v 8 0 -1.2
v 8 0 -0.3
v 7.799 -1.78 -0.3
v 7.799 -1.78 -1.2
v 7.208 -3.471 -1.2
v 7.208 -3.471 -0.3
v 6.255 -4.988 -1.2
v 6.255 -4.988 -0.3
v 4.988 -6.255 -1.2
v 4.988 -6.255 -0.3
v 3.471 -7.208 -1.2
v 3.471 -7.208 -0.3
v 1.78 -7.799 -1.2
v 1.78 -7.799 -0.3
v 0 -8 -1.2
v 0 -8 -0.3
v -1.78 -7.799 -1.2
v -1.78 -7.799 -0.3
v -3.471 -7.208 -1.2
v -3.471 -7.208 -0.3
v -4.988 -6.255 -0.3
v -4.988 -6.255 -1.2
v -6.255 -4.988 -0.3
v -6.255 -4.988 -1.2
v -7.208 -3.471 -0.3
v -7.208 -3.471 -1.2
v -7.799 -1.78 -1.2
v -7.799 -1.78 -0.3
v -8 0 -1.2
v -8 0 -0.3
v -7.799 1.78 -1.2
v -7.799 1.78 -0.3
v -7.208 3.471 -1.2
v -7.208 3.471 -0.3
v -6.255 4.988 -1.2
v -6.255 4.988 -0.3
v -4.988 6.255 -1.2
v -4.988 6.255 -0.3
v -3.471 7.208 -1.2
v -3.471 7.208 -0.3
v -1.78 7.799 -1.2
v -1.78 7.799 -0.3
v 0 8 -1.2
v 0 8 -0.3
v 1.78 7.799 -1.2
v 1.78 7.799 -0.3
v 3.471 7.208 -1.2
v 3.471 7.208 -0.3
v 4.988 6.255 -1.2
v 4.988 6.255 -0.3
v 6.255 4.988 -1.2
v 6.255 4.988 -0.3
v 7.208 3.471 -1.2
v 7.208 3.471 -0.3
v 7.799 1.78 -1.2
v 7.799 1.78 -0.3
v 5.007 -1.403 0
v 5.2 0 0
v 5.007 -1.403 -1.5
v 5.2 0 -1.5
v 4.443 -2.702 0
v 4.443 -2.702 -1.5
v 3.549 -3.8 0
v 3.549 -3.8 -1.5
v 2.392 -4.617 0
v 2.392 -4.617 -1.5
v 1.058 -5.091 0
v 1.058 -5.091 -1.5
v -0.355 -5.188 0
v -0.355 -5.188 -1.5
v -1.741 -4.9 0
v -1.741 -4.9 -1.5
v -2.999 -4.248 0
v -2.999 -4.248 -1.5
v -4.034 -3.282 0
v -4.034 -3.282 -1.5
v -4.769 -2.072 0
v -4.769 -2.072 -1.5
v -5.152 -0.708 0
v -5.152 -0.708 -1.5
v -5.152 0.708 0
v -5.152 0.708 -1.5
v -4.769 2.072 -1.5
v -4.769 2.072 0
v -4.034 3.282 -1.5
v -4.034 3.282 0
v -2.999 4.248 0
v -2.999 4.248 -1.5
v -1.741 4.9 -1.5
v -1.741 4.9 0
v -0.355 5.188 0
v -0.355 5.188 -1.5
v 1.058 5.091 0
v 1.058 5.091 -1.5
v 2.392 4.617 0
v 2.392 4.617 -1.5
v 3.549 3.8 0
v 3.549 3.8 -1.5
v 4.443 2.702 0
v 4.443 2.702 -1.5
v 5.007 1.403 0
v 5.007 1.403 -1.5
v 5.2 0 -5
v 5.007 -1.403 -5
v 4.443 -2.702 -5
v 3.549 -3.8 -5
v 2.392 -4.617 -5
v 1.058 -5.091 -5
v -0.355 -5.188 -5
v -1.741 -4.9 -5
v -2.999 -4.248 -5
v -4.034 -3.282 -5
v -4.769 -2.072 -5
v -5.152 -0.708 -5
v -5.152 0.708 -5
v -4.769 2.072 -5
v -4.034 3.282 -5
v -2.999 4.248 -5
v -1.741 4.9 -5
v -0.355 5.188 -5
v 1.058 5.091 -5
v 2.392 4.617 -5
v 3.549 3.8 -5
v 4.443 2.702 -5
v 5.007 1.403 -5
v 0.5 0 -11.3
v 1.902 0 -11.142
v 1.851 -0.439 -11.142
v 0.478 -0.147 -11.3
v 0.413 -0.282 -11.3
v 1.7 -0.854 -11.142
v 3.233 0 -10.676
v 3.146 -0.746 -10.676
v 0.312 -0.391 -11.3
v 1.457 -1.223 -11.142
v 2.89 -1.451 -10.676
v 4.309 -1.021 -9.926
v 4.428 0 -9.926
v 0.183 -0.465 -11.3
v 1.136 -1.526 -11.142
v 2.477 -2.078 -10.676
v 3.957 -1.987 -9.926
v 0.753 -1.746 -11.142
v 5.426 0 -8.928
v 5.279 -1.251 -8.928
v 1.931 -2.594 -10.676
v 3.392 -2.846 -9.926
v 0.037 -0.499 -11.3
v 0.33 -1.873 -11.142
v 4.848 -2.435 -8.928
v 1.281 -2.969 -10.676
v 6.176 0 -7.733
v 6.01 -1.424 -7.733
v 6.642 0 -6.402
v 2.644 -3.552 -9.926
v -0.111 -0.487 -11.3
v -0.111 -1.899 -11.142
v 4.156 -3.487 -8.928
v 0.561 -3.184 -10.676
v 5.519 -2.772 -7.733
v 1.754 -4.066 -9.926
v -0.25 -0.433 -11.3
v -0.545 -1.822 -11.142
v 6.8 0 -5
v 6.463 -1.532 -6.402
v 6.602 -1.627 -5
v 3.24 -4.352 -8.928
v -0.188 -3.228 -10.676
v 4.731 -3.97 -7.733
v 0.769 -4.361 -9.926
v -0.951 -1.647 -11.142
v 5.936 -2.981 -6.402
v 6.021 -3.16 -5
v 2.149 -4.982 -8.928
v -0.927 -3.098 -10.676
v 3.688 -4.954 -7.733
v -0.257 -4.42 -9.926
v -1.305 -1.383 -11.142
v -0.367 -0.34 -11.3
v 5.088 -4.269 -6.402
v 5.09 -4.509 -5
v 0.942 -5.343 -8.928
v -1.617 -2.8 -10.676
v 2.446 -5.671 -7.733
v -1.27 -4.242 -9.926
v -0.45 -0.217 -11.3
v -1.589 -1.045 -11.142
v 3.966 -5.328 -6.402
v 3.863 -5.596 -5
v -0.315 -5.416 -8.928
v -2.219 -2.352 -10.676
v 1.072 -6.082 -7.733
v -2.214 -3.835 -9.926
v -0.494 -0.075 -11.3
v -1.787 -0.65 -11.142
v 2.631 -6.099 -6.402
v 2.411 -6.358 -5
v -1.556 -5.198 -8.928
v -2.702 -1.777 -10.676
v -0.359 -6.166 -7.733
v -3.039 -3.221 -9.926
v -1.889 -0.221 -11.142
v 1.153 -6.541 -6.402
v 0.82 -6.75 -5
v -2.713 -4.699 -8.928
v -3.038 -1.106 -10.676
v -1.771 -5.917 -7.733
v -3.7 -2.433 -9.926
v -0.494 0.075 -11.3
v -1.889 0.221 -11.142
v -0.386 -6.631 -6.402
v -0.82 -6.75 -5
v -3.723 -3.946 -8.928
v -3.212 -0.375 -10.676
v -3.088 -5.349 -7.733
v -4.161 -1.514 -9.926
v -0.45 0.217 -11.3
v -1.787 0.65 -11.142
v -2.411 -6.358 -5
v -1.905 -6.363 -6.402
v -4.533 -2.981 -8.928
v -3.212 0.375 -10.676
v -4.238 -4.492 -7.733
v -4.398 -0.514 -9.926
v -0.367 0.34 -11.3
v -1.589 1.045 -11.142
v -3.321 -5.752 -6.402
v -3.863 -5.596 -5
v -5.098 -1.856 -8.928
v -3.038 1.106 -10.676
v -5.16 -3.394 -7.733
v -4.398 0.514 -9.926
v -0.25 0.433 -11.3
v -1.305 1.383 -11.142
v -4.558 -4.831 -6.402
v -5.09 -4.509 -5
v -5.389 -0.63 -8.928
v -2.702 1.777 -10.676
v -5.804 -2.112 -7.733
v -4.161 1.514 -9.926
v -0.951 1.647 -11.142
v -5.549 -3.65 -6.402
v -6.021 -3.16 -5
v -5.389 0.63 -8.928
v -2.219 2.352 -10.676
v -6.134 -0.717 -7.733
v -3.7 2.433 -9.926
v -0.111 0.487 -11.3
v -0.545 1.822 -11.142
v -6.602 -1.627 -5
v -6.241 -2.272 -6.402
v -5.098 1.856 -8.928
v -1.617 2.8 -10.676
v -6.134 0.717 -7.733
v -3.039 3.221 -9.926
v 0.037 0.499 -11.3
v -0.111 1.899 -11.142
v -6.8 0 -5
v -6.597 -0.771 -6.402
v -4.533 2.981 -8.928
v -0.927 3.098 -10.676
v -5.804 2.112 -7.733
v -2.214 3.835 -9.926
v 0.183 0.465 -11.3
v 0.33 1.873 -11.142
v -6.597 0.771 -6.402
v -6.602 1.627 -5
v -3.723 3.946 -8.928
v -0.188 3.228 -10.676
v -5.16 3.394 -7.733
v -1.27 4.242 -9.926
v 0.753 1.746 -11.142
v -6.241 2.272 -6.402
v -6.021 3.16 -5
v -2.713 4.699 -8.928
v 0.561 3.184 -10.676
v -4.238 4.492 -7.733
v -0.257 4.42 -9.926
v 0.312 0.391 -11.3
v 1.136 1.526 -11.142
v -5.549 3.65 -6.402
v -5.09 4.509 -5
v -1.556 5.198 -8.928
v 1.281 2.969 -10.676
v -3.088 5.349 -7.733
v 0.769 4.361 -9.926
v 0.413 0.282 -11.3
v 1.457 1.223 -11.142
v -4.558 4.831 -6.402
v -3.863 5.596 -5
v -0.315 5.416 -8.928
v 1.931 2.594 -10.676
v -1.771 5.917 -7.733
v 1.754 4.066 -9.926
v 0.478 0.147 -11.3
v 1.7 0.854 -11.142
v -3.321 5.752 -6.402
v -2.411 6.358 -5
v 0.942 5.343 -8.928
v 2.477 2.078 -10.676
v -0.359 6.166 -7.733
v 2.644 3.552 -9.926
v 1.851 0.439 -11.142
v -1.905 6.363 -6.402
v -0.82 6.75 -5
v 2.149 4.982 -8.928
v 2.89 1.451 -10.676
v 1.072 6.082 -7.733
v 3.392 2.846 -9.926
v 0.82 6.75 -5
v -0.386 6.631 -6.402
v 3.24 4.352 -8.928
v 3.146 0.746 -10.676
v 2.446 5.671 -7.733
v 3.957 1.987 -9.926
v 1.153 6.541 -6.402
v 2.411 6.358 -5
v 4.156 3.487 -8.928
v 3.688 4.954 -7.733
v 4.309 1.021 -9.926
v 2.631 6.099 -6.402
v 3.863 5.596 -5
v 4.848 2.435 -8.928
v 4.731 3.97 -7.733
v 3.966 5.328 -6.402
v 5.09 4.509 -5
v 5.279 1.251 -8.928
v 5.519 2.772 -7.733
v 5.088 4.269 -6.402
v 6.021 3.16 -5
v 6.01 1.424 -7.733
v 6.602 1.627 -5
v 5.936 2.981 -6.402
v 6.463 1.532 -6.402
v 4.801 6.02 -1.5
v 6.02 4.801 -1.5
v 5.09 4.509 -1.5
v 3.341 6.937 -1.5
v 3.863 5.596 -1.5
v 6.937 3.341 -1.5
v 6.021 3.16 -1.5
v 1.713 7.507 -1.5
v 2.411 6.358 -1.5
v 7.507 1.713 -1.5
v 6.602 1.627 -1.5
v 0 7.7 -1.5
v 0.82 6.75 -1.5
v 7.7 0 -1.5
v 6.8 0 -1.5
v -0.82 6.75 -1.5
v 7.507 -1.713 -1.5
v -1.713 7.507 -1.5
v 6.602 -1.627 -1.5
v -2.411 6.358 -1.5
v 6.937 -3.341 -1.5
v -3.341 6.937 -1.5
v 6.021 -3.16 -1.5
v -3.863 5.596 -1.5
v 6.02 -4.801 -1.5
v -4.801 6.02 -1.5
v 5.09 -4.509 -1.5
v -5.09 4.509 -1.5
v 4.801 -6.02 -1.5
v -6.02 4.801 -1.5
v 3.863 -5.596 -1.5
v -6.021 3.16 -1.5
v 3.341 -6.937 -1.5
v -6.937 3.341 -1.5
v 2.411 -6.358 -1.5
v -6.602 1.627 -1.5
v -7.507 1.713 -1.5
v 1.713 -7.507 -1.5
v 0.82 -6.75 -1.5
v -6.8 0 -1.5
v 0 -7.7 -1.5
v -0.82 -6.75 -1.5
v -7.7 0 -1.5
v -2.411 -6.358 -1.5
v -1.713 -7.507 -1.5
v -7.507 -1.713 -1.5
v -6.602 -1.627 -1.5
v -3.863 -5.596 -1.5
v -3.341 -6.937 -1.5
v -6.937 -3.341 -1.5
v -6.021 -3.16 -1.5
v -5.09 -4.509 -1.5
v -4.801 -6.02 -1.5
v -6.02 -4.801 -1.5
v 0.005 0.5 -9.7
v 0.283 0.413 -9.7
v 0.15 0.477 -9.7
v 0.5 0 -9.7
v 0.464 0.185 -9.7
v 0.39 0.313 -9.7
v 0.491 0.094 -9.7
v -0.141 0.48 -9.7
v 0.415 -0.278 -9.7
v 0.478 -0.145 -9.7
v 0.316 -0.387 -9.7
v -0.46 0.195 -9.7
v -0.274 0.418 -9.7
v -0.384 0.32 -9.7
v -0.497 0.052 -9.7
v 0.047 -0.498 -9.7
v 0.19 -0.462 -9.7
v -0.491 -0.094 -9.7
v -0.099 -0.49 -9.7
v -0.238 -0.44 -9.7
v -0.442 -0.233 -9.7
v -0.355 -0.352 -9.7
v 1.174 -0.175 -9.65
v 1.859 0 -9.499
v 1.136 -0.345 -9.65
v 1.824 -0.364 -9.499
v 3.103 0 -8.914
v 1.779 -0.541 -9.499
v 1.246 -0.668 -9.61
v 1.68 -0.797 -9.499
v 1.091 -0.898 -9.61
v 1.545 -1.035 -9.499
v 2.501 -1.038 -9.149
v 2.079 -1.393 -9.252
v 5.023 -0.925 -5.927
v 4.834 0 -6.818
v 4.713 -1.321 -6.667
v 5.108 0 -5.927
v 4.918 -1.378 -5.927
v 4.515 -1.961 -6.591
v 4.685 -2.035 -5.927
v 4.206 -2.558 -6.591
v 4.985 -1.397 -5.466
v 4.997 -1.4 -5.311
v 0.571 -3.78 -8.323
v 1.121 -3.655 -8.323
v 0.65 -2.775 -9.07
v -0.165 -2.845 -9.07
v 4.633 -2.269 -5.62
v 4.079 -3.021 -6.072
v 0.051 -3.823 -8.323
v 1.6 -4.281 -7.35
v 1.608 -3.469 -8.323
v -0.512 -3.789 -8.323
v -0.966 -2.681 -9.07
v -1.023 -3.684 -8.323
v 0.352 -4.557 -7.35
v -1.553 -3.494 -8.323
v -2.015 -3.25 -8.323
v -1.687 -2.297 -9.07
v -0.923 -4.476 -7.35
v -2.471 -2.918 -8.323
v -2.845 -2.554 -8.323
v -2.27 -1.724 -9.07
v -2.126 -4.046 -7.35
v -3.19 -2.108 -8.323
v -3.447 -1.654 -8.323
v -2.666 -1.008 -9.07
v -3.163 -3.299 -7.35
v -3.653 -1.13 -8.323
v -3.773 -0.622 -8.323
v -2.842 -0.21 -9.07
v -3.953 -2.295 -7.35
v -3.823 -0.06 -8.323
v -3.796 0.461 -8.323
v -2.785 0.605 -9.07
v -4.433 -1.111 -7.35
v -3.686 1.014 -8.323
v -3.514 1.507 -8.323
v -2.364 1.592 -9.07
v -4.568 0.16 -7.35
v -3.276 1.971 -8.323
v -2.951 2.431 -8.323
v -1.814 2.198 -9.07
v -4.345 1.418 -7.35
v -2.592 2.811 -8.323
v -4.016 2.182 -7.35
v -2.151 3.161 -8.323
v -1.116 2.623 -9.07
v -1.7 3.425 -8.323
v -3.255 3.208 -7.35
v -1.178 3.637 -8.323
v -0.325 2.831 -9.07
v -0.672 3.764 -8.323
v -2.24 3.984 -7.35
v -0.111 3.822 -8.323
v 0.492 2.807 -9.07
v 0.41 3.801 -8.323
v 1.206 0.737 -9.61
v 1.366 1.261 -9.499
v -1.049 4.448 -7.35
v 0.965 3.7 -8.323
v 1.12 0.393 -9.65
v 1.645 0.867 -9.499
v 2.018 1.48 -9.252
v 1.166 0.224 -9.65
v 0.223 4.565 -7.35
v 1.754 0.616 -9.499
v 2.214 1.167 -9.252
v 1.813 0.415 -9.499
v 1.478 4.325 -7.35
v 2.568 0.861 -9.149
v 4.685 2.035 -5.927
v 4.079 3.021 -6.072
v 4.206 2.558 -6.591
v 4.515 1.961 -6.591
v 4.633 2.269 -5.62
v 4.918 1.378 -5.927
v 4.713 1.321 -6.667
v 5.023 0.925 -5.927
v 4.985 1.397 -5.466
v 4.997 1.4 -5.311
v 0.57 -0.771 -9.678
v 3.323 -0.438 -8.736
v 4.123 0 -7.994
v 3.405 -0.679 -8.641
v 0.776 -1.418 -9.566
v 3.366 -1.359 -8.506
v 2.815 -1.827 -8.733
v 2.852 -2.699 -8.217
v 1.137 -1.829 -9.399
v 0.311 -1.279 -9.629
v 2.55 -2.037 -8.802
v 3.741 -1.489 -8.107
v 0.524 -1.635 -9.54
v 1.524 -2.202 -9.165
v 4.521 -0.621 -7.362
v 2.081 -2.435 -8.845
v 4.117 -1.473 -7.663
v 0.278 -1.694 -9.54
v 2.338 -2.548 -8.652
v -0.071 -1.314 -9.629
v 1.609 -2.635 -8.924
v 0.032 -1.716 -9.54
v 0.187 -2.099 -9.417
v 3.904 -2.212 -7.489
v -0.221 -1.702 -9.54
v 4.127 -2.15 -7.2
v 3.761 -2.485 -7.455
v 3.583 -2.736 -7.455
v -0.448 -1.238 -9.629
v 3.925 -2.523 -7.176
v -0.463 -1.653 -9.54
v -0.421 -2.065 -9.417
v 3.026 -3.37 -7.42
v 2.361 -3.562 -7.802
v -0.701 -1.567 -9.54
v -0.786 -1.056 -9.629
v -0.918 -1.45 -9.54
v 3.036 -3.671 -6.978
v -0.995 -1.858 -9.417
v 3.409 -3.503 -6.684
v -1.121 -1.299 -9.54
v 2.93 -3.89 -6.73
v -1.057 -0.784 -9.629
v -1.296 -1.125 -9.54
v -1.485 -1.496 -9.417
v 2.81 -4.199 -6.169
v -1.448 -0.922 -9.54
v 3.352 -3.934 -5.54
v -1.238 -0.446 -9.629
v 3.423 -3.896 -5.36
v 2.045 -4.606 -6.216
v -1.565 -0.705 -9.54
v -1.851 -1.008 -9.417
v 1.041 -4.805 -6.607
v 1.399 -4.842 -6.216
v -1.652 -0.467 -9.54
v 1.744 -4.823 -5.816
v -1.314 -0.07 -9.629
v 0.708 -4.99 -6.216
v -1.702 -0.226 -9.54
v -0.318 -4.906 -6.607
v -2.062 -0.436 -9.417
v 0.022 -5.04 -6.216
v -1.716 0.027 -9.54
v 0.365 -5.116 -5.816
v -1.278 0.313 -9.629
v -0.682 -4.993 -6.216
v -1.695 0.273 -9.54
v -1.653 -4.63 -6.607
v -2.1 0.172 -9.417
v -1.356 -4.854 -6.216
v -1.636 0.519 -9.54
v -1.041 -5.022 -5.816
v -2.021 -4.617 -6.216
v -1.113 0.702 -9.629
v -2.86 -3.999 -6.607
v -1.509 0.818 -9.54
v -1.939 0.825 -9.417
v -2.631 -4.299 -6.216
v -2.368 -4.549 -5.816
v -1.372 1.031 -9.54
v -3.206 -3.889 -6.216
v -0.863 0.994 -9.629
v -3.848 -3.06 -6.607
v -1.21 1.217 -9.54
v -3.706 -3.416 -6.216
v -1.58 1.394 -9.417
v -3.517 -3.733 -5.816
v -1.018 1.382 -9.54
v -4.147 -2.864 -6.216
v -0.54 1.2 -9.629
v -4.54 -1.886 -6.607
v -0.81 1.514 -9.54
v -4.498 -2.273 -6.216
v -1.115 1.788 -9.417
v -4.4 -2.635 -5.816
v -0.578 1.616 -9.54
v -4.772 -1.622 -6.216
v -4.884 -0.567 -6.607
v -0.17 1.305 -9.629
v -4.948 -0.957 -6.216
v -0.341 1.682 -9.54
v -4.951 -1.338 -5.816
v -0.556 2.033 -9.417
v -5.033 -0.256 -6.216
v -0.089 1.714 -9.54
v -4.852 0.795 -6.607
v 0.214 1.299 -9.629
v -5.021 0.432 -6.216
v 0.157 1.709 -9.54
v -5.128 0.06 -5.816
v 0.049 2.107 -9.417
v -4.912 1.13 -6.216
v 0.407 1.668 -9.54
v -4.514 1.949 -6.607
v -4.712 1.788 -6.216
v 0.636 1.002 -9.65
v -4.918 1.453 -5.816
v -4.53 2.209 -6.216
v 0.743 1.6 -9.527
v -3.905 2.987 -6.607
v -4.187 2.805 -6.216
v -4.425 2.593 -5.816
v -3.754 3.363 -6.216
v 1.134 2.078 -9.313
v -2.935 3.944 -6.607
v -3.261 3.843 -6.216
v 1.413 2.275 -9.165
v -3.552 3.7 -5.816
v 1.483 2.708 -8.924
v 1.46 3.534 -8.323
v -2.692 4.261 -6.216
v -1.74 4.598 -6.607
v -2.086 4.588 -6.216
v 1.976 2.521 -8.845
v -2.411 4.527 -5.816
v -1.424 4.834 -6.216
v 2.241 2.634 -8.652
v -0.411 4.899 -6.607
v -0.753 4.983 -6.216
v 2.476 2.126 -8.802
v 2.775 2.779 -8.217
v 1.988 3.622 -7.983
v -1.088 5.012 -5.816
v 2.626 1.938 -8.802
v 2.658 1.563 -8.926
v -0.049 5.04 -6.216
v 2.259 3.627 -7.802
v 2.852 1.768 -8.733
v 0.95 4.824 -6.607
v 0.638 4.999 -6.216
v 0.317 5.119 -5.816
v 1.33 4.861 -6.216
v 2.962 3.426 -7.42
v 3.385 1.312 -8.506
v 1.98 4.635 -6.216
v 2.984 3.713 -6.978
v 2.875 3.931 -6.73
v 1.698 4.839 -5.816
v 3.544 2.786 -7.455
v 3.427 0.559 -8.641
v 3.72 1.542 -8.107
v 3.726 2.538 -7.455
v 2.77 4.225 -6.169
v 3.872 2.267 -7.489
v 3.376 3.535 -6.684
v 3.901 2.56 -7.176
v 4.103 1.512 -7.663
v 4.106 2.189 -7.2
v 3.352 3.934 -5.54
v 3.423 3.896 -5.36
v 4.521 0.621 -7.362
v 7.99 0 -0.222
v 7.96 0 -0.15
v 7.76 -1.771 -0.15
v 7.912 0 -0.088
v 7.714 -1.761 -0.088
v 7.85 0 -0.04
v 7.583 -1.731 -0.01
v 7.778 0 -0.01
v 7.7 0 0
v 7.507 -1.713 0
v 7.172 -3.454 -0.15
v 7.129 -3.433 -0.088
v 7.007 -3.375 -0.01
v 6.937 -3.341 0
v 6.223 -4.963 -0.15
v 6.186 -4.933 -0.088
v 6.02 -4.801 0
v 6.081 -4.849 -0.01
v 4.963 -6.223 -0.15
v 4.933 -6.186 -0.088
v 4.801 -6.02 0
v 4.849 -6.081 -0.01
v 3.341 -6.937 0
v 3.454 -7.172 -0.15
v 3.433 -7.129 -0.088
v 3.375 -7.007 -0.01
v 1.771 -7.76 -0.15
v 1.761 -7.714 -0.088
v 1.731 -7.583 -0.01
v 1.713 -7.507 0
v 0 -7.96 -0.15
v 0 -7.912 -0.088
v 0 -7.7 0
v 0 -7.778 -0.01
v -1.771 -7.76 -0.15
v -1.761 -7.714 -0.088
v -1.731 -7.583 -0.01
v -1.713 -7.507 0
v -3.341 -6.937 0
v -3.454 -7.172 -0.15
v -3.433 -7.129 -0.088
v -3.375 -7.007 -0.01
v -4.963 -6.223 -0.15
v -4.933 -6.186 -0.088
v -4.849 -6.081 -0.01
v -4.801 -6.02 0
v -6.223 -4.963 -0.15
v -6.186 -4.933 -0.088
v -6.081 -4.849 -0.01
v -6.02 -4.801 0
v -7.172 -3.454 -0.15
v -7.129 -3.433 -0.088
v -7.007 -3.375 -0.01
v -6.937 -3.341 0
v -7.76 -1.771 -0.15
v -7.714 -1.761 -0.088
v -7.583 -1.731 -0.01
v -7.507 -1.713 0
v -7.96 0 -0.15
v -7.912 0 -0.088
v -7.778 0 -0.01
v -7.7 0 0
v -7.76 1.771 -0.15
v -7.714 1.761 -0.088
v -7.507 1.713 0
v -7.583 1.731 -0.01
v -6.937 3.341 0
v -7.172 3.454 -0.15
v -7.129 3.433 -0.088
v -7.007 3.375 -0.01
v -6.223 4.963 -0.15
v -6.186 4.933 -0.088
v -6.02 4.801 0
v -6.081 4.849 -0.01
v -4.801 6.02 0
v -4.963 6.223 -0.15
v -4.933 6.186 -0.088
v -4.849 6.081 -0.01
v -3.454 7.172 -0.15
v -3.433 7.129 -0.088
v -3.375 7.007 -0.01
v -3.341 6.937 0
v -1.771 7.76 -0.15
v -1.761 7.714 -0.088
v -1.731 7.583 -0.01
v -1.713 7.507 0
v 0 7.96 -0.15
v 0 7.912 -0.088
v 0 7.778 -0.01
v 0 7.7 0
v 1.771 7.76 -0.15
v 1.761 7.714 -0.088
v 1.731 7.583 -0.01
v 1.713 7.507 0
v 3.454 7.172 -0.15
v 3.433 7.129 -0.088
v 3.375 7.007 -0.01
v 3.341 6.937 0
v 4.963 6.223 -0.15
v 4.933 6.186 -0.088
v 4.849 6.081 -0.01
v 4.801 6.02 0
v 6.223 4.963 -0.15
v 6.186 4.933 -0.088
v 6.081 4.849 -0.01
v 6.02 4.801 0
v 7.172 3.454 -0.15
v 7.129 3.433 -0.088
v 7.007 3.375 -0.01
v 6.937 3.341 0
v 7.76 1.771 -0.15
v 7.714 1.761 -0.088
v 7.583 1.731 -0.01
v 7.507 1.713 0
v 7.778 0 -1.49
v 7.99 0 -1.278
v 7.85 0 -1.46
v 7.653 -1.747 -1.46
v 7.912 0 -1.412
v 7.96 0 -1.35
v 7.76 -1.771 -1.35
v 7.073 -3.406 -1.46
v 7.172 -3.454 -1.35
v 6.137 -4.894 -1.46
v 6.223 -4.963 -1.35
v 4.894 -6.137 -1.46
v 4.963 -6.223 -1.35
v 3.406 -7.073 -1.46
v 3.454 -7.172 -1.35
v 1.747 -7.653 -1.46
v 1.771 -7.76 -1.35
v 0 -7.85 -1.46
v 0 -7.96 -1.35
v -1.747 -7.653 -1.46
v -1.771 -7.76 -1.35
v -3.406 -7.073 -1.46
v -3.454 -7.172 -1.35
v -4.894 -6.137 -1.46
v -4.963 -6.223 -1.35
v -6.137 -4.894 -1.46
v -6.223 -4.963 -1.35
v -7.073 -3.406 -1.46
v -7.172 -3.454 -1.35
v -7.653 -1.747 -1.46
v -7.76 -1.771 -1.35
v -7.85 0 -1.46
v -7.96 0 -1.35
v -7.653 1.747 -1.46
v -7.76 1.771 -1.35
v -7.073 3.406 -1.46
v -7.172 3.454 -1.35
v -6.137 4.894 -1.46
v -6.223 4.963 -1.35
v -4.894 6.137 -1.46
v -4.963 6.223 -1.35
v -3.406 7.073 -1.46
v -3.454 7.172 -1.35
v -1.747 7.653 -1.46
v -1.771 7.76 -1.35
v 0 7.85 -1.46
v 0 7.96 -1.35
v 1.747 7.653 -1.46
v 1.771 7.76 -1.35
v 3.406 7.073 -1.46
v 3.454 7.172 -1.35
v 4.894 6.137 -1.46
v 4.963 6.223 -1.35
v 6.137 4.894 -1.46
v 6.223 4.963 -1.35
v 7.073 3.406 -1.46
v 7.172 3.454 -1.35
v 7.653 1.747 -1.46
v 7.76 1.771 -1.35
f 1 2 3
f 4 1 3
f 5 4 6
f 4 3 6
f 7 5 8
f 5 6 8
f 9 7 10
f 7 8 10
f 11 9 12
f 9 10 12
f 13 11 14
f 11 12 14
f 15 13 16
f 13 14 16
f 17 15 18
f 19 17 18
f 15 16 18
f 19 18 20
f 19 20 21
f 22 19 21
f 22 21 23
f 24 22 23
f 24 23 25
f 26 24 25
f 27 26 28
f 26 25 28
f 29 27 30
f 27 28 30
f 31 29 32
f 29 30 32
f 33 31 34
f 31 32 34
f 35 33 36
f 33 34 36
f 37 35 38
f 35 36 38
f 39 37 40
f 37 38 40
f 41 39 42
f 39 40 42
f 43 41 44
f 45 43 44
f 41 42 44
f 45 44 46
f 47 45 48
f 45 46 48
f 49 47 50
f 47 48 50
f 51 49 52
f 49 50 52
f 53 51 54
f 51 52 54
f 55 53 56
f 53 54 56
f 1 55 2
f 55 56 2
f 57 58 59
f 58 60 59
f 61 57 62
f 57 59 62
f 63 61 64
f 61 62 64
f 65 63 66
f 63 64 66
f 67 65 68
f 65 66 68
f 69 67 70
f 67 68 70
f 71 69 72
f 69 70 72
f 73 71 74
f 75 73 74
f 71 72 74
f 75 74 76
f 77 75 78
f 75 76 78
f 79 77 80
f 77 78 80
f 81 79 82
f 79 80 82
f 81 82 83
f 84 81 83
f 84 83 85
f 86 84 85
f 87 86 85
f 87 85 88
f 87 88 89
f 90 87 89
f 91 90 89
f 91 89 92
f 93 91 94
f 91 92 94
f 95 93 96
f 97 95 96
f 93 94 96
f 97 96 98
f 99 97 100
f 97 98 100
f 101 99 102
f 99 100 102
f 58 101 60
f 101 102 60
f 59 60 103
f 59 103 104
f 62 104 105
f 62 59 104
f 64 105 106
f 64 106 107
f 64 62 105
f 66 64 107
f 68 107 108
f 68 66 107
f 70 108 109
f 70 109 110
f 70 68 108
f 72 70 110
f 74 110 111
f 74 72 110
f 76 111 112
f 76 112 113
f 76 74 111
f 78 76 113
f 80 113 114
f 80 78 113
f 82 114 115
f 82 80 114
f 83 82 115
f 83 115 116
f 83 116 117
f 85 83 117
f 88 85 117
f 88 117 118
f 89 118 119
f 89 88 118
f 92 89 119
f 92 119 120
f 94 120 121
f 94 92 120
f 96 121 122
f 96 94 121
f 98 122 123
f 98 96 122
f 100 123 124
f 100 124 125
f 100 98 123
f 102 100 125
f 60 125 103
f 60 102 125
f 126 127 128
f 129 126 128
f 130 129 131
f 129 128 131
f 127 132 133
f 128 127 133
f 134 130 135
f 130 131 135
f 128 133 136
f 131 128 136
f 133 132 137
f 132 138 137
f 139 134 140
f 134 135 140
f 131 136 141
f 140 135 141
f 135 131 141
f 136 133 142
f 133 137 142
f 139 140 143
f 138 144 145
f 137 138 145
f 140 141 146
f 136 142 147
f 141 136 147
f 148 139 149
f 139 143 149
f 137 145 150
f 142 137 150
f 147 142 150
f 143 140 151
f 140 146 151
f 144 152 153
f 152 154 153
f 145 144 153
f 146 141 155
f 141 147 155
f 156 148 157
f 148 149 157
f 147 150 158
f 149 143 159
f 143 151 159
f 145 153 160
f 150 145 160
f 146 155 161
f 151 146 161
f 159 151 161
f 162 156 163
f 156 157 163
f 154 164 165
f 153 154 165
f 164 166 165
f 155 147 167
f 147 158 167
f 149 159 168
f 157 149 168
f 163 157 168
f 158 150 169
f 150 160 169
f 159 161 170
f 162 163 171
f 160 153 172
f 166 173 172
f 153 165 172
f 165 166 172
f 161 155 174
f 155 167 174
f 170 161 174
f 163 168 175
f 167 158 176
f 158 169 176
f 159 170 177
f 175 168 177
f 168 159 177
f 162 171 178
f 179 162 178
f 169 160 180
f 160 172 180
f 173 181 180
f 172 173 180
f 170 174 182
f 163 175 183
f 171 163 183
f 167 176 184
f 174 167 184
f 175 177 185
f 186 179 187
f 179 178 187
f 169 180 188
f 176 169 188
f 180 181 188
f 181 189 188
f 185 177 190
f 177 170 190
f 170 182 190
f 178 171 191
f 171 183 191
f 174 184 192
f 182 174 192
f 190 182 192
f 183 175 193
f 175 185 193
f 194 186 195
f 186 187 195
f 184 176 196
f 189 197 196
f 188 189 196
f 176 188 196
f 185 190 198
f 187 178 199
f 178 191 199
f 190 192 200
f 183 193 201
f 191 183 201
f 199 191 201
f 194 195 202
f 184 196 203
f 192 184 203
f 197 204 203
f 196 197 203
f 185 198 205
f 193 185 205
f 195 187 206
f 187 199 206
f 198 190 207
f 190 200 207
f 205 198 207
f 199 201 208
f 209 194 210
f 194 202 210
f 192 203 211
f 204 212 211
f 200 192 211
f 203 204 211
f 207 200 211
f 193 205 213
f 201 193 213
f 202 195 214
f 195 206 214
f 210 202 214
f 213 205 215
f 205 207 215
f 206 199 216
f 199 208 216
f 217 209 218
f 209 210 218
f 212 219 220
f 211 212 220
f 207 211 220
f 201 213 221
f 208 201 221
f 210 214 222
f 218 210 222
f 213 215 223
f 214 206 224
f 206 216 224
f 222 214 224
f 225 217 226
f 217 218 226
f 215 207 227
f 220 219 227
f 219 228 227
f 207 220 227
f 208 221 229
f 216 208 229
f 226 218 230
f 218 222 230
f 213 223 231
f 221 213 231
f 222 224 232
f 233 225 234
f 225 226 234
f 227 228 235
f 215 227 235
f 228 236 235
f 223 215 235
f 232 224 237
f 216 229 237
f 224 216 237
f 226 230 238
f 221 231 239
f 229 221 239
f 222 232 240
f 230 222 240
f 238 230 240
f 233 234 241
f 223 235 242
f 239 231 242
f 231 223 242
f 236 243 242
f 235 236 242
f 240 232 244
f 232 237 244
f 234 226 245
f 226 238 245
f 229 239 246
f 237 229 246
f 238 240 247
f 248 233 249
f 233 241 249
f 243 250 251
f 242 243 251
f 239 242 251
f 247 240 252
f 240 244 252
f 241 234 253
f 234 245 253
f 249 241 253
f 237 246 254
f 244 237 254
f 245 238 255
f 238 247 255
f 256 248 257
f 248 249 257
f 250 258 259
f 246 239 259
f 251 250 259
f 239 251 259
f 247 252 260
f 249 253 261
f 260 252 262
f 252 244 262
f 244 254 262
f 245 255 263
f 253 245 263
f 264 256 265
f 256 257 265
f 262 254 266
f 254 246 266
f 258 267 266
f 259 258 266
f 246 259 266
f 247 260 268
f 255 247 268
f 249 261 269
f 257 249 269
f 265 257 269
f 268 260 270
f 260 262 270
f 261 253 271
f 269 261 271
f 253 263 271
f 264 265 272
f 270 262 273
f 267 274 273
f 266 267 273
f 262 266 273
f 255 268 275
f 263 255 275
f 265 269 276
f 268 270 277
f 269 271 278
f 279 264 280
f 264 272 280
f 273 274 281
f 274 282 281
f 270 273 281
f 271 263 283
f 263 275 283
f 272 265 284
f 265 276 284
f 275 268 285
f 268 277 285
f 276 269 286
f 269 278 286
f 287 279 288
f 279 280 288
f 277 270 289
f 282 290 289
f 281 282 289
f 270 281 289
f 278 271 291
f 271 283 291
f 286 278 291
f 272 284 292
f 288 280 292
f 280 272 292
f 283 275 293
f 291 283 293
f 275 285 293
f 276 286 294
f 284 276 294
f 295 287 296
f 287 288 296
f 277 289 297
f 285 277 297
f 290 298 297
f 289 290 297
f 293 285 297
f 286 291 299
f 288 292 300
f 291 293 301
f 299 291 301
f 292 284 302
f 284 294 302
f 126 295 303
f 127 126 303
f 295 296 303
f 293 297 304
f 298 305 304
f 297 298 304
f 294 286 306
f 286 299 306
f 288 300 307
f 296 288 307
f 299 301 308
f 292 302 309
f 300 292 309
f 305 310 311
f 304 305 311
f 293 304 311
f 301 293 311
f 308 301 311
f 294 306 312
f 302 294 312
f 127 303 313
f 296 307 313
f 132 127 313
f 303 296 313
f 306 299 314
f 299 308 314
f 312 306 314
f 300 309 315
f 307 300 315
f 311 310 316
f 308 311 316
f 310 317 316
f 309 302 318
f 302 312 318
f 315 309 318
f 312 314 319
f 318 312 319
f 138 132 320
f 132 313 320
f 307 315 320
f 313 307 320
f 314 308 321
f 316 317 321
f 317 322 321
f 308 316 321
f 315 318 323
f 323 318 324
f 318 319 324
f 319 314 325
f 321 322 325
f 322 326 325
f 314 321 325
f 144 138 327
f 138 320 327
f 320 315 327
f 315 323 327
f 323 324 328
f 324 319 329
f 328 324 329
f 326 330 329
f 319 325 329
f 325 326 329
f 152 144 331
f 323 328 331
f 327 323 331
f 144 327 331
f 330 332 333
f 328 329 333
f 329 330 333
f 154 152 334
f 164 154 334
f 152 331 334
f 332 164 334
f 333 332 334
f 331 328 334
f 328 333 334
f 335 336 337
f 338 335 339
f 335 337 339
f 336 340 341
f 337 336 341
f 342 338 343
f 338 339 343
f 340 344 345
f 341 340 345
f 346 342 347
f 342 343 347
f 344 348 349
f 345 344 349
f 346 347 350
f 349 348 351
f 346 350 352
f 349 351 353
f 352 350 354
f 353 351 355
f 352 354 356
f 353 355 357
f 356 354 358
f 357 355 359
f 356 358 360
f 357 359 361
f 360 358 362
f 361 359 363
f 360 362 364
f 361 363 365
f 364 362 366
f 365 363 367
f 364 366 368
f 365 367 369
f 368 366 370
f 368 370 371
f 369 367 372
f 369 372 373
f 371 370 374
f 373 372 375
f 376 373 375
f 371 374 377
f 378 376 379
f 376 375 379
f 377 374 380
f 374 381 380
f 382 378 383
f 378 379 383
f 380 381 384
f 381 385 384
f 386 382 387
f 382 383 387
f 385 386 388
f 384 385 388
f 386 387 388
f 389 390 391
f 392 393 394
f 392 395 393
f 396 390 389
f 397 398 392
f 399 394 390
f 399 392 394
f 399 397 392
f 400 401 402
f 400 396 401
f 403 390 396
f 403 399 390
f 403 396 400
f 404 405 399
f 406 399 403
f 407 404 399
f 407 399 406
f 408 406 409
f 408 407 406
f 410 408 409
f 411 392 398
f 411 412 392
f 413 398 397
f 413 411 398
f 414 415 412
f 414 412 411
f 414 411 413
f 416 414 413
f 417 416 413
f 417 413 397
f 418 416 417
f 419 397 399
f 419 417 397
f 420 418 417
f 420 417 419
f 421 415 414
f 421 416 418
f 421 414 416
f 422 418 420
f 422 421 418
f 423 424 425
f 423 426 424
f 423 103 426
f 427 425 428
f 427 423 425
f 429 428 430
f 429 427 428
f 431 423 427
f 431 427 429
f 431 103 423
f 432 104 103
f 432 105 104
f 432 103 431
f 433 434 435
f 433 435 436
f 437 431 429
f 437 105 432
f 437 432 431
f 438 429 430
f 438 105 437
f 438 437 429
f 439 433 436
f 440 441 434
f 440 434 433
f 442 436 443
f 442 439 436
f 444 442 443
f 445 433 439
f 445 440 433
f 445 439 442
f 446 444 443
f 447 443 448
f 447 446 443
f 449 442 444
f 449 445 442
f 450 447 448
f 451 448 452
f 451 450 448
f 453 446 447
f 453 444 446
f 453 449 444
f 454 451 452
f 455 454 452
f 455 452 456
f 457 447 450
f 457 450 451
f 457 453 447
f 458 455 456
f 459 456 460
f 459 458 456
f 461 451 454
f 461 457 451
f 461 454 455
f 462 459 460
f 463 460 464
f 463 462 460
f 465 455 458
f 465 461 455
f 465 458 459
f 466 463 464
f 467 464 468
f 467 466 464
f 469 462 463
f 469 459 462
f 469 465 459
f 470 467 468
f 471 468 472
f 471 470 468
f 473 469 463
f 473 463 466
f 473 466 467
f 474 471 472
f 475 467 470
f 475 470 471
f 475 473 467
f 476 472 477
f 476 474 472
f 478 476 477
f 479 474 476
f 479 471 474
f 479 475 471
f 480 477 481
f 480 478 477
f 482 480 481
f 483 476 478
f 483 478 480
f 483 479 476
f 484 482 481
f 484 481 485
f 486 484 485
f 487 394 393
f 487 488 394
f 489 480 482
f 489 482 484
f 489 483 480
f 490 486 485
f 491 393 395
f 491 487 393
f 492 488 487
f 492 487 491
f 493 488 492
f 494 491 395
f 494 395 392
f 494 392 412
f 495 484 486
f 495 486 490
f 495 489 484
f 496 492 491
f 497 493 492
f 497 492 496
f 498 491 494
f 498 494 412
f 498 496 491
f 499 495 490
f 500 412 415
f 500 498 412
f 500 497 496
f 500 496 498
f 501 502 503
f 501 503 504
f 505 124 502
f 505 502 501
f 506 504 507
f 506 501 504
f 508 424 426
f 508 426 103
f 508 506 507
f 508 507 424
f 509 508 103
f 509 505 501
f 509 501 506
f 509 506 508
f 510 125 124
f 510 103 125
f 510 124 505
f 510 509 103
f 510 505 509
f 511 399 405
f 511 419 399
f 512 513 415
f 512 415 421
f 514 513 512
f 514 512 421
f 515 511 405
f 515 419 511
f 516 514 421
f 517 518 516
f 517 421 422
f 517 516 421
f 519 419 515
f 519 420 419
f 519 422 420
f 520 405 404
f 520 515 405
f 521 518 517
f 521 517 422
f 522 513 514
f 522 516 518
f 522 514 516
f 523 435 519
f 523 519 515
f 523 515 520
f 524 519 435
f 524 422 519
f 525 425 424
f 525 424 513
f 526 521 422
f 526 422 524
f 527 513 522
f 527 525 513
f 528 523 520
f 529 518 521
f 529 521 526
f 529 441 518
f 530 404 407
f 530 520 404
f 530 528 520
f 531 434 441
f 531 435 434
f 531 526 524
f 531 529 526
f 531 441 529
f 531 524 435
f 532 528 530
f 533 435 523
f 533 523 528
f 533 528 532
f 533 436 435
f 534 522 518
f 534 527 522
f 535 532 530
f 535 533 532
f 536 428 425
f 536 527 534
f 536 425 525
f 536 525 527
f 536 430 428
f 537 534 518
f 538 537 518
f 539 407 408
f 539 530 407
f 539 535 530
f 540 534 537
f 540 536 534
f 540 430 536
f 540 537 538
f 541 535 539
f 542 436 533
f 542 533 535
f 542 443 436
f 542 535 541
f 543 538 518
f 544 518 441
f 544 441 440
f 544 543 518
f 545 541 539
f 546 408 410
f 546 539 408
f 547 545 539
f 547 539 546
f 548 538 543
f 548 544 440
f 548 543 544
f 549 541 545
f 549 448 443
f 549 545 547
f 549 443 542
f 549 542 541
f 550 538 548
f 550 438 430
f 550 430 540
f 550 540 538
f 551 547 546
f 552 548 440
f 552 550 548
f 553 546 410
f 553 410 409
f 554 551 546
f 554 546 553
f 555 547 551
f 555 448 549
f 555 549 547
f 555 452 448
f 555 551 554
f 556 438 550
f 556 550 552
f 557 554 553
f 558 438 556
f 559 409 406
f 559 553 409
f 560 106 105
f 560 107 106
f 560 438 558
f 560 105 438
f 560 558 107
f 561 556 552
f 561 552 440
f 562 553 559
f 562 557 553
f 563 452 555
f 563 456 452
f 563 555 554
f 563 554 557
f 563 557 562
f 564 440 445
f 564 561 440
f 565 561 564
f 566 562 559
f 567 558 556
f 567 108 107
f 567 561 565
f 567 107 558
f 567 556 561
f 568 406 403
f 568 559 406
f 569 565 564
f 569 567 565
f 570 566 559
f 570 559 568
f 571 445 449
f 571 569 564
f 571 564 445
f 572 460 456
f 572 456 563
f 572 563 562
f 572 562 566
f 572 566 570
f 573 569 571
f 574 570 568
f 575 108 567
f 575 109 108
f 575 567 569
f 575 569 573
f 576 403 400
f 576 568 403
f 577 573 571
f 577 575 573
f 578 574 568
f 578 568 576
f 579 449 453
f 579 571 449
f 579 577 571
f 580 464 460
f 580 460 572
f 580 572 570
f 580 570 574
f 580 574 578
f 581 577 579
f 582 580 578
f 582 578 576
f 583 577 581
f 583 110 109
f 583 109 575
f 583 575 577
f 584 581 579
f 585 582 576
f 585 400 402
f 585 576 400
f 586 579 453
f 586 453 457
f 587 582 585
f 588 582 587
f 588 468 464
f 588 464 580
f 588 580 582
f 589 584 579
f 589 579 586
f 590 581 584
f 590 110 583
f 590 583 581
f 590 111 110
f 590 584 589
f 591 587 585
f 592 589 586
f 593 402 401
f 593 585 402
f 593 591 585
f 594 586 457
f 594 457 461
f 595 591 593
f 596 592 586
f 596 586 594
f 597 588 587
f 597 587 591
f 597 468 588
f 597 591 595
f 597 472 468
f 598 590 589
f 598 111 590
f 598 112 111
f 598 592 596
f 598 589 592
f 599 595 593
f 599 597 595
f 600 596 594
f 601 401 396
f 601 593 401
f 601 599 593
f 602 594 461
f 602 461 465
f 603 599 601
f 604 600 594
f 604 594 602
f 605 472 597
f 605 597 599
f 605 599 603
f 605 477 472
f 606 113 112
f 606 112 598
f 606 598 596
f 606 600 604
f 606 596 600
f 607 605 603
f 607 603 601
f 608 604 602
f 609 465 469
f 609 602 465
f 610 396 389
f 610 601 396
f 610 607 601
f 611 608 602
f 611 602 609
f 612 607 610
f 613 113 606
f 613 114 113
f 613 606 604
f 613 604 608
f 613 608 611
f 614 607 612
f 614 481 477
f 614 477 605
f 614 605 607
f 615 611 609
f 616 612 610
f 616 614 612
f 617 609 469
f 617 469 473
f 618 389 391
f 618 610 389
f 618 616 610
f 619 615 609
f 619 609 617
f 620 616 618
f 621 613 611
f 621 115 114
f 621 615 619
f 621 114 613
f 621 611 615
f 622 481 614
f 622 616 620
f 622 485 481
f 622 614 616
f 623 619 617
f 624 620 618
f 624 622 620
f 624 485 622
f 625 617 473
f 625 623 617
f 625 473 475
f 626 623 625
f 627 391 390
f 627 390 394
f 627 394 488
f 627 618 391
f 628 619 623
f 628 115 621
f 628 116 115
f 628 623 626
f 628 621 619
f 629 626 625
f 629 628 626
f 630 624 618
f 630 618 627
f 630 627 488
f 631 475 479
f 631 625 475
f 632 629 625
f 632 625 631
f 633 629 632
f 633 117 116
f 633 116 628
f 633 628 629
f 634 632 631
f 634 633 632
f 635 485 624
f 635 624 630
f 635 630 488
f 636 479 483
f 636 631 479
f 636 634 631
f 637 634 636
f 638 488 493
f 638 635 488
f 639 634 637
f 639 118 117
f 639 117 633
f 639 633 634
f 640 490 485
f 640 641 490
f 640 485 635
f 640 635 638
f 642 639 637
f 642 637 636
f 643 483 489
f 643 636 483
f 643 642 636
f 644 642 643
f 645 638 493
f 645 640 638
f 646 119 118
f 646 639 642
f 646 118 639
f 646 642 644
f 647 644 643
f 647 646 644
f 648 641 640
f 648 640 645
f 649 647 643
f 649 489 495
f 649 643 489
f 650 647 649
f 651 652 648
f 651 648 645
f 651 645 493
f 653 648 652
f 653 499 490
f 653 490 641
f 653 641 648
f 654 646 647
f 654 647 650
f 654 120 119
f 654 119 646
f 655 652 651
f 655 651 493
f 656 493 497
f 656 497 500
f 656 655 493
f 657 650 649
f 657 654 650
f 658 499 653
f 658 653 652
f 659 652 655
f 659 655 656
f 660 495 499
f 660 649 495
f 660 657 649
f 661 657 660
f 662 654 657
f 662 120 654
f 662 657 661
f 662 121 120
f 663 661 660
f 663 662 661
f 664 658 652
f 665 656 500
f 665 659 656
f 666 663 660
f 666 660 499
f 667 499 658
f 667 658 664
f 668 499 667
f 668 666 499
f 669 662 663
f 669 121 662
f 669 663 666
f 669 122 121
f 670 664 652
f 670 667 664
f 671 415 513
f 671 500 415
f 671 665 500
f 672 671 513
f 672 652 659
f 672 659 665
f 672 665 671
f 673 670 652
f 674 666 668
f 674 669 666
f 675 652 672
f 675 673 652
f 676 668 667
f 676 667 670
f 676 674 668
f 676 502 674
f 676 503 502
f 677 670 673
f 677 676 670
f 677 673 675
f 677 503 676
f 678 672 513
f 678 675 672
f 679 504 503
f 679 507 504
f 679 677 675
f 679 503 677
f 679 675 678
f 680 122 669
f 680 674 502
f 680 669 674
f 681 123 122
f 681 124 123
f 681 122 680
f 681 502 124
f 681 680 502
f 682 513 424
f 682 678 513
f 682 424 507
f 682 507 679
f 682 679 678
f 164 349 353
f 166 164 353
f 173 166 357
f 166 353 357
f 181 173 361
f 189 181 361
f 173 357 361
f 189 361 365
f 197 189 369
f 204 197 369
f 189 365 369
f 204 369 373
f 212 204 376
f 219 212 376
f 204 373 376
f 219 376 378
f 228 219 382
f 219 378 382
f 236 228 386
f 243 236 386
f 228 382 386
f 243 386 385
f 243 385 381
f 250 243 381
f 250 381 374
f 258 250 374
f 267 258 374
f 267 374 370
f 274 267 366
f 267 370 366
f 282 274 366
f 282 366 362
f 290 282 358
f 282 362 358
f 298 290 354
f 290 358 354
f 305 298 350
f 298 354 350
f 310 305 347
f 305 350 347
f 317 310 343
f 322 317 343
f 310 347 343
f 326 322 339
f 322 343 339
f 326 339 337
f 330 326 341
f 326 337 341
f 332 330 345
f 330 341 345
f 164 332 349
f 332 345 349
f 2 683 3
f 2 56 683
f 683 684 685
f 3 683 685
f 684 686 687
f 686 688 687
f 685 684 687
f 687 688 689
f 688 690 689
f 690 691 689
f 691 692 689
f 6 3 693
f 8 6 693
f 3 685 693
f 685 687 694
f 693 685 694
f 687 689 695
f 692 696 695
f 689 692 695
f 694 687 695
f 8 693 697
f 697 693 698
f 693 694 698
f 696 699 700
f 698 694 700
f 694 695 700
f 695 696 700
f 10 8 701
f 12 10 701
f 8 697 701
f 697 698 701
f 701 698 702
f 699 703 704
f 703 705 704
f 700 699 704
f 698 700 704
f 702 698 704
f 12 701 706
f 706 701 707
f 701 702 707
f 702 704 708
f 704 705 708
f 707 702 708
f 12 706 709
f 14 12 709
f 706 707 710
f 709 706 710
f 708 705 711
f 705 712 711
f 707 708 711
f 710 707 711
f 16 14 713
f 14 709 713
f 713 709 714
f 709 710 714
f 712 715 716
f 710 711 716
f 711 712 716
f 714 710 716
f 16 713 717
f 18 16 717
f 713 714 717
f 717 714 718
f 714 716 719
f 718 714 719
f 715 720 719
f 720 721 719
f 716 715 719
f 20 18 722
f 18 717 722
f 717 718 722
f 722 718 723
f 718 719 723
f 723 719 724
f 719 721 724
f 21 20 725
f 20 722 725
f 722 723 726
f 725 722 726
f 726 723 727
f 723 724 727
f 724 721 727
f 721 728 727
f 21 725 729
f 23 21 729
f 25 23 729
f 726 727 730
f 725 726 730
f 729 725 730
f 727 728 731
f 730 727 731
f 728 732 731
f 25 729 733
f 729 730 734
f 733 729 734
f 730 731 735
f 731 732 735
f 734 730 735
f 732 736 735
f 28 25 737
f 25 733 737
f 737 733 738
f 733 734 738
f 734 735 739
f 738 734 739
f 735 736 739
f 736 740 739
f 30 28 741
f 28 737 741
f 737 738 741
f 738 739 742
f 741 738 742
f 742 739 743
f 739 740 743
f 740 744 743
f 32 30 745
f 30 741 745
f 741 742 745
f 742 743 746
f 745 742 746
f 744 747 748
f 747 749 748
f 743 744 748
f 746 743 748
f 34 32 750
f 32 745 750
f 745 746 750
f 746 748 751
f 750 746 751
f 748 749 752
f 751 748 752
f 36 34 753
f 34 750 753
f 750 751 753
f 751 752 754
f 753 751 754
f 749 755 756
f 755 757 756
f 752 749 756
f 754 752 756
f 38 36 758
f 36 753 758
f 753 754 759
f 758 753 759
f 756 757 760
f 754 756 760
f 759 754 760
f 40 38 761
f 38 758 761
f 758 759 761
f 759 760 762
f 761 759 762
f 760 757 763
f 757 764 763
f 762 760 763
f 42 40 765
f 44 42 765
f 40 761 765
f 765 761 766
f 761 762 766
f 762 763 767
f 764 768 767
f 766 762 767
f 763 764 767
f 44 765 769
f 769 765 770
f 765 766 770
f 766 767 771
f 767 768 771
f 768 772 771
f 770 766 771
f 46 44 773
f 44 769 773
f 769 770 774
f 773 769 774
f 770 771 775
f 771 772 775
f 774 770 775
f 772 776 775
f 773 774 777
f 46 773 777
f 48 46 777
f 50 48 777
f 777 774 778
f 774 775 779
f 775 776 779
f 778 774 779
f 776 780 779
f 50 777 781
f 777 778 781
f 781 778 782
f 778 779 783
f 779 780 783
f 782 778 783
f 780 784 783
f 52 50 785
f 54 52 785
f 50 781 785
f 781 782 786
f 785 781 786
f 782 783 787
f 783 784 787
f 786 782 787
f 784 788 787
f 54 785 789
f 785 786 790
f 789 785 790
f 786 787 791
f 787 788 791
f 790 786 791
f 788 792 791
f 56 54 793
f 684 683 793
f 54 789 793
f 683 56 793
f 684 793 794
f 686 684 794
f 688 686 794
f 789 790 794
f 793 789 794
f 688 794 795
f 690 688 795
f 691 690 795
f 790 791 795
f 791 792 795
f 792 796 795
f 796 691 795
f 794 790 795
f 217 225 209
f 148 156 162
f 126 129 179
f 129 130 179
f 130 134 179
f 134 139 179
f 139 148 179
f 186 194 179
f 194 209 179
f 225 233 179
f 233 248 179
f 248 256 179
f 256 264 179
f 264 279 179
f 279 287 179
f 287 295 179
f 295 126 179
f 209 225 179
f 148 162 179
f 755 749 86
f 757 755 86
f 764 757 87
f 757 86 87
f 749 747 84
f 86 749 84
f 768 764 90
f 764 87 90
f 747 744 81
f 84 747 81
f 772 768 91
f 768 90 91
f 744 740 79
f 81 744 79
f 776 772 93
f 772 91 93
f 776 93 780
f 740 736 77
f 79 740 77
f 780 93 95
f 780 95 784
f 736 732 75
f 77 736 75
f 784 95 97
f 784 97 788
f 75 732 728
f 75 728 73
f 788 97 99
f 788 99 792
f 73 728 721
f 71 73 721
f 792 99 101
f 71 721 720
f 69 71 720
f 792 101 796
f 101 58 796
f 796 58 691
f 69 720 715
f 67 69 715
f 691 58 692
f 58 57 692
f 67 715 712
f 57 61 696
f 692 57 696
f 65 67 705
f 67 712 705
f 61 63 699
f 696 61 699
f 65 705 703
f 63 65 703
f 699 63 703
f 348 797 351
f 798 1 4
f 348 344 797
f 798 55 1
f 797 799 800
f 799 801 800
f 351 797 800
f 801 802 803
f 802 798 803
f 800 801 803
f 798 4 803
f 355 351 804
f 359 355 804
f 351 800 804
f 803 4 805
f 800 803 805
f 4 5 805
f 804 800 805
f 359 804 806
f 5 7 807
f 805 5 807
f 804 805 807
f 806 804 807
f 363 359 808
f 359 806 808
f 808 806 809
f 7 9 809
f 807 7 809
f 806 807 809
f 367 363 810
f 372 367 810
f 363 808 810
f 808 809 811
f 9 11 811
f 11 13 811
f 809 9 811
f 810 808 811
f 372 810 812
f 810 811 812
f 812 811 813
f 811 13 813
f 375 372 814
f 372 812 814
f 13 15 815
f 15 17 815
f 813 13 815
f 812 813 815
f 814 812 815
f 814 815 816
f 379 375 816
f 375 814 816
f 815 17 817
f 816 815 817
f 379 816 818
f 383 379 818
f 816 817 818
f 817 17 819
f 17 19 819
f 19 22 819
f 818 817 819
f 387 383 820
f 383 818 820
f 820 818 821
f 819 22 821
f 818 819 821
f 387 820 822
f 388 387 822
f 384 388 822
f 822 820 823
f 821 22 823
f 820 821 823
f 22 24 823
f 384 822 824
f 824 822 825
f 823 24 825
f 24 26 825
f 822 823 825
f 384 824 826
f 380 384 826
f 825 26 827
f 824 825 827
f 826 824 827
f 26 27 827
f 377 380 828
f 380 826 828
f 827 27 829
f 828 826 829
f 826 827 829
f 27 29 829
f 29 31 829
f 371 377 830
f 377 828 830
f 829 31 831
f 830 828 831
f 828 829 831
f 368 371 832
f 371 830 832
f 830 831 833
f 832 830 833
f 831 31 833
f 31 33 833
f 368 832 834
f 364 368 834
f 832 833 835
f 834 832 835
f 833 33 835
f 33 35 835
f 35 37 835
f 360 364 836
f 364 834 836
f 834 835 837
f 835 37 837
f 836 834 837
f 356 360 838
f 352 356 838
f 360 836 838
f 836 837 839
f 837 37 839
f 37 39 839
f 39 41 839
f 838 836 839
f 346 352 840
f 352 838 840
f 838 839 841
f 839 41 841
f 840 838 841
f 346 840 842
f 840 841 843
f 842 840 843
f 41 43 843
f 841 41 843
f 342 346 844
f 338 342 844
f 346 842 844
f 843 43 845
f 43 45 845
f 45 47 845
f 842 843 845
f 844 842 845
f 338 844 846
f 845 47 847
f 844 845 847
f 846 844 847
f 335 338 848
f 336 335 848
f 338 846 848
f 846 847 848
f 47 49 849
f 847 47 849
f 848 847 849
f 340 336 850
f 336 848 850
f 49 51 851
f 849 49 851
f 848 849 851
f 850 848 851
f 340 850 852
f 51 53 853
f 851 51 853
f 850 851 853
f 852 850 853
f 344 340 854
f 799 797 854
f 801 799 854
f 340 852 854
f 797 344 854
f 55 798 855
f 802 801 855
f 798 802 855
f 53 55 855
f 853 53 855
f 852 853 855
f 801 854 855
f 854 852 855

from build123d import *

# Parameters (mm, degrees)
F2_R = 6.3
F3_R = 0.3
F4_T = 1.6


# Not quite as in the source:
# - a shell that OpenCascade refuses in one call is made with other operations: the cavity is built on its own and cut out


with BuildPart() as f1:
    # F0 (on Front) → F1 (revolve)
    with BuildSketch(Plane.XZ):
        Polygon((8, 0), (0, 0), (0, -11.3), (6.8, -11.3), (6.8, -1.5), (8, -1.5), align=None)
    revolve(axis=Axis((0, 0, -5.65), (0, 0, -1)))

    # F2
    f2_edges = [f1.edges().sort_by_distance(p)[0] for p in [
        (-6.8, 0, -11.3),
    ]]
    fillet(f2_edges, radius=F2_R)

    # F3
    f3_edges = [f1.edges().sort_by_distance(p)[0] for p in [
        (-8, 0, -1.5),
        (-8, 0, 0),
        (8, 0, -0.75),
    ]]
    fillet(f3_edges, radius=F3_R)

    # F4: shell of thickness 1.6, made by hand


with BuildPart() as f4_core1:
    # F4_t2: copy of F1
    add(f1.part)

    # the walls: a layer under each face that stays
    f4_faces = [f4_core1.faces().sort_by_distance(p)[0] for p in [
        (5.1333333333, 5.1333333333, -1.5),
        (-6.8, 0, -3.25),
        (-8, 0, -0.75),
        (-4.9547727215, 0, -9.4547727215),
        (0, 0, -11.3),
    ]]
    thicken(f4_faces, amount=-F4_T, mode=Mode.SUBTRACT)

    # F4_s3 → F4_t4 (revolve, cut)
    with BuildSketch(Plane.XZ):
        Polygon((6.816, -1.516), (6.8, 0.1), (5.2, 0.1), (5.2, -1.5), align=None)
    revolve(axis=Axis((0, 0, -1.5), (0, 0, -1)), mode=Mode.SUBTRACT)


with BuildPart() as f1_1:
    add(f1.part)

    # what is left inside the walls is the cavity
    f4_cavity = [f4_core1.part.solids().sort_by_distance(p)[0] for p in [
        (-2.842, 0, -9.056463),
    ]]
    add(f4_cavity, mode=Mode.SUBTRACT)


solid = f1_1.part
